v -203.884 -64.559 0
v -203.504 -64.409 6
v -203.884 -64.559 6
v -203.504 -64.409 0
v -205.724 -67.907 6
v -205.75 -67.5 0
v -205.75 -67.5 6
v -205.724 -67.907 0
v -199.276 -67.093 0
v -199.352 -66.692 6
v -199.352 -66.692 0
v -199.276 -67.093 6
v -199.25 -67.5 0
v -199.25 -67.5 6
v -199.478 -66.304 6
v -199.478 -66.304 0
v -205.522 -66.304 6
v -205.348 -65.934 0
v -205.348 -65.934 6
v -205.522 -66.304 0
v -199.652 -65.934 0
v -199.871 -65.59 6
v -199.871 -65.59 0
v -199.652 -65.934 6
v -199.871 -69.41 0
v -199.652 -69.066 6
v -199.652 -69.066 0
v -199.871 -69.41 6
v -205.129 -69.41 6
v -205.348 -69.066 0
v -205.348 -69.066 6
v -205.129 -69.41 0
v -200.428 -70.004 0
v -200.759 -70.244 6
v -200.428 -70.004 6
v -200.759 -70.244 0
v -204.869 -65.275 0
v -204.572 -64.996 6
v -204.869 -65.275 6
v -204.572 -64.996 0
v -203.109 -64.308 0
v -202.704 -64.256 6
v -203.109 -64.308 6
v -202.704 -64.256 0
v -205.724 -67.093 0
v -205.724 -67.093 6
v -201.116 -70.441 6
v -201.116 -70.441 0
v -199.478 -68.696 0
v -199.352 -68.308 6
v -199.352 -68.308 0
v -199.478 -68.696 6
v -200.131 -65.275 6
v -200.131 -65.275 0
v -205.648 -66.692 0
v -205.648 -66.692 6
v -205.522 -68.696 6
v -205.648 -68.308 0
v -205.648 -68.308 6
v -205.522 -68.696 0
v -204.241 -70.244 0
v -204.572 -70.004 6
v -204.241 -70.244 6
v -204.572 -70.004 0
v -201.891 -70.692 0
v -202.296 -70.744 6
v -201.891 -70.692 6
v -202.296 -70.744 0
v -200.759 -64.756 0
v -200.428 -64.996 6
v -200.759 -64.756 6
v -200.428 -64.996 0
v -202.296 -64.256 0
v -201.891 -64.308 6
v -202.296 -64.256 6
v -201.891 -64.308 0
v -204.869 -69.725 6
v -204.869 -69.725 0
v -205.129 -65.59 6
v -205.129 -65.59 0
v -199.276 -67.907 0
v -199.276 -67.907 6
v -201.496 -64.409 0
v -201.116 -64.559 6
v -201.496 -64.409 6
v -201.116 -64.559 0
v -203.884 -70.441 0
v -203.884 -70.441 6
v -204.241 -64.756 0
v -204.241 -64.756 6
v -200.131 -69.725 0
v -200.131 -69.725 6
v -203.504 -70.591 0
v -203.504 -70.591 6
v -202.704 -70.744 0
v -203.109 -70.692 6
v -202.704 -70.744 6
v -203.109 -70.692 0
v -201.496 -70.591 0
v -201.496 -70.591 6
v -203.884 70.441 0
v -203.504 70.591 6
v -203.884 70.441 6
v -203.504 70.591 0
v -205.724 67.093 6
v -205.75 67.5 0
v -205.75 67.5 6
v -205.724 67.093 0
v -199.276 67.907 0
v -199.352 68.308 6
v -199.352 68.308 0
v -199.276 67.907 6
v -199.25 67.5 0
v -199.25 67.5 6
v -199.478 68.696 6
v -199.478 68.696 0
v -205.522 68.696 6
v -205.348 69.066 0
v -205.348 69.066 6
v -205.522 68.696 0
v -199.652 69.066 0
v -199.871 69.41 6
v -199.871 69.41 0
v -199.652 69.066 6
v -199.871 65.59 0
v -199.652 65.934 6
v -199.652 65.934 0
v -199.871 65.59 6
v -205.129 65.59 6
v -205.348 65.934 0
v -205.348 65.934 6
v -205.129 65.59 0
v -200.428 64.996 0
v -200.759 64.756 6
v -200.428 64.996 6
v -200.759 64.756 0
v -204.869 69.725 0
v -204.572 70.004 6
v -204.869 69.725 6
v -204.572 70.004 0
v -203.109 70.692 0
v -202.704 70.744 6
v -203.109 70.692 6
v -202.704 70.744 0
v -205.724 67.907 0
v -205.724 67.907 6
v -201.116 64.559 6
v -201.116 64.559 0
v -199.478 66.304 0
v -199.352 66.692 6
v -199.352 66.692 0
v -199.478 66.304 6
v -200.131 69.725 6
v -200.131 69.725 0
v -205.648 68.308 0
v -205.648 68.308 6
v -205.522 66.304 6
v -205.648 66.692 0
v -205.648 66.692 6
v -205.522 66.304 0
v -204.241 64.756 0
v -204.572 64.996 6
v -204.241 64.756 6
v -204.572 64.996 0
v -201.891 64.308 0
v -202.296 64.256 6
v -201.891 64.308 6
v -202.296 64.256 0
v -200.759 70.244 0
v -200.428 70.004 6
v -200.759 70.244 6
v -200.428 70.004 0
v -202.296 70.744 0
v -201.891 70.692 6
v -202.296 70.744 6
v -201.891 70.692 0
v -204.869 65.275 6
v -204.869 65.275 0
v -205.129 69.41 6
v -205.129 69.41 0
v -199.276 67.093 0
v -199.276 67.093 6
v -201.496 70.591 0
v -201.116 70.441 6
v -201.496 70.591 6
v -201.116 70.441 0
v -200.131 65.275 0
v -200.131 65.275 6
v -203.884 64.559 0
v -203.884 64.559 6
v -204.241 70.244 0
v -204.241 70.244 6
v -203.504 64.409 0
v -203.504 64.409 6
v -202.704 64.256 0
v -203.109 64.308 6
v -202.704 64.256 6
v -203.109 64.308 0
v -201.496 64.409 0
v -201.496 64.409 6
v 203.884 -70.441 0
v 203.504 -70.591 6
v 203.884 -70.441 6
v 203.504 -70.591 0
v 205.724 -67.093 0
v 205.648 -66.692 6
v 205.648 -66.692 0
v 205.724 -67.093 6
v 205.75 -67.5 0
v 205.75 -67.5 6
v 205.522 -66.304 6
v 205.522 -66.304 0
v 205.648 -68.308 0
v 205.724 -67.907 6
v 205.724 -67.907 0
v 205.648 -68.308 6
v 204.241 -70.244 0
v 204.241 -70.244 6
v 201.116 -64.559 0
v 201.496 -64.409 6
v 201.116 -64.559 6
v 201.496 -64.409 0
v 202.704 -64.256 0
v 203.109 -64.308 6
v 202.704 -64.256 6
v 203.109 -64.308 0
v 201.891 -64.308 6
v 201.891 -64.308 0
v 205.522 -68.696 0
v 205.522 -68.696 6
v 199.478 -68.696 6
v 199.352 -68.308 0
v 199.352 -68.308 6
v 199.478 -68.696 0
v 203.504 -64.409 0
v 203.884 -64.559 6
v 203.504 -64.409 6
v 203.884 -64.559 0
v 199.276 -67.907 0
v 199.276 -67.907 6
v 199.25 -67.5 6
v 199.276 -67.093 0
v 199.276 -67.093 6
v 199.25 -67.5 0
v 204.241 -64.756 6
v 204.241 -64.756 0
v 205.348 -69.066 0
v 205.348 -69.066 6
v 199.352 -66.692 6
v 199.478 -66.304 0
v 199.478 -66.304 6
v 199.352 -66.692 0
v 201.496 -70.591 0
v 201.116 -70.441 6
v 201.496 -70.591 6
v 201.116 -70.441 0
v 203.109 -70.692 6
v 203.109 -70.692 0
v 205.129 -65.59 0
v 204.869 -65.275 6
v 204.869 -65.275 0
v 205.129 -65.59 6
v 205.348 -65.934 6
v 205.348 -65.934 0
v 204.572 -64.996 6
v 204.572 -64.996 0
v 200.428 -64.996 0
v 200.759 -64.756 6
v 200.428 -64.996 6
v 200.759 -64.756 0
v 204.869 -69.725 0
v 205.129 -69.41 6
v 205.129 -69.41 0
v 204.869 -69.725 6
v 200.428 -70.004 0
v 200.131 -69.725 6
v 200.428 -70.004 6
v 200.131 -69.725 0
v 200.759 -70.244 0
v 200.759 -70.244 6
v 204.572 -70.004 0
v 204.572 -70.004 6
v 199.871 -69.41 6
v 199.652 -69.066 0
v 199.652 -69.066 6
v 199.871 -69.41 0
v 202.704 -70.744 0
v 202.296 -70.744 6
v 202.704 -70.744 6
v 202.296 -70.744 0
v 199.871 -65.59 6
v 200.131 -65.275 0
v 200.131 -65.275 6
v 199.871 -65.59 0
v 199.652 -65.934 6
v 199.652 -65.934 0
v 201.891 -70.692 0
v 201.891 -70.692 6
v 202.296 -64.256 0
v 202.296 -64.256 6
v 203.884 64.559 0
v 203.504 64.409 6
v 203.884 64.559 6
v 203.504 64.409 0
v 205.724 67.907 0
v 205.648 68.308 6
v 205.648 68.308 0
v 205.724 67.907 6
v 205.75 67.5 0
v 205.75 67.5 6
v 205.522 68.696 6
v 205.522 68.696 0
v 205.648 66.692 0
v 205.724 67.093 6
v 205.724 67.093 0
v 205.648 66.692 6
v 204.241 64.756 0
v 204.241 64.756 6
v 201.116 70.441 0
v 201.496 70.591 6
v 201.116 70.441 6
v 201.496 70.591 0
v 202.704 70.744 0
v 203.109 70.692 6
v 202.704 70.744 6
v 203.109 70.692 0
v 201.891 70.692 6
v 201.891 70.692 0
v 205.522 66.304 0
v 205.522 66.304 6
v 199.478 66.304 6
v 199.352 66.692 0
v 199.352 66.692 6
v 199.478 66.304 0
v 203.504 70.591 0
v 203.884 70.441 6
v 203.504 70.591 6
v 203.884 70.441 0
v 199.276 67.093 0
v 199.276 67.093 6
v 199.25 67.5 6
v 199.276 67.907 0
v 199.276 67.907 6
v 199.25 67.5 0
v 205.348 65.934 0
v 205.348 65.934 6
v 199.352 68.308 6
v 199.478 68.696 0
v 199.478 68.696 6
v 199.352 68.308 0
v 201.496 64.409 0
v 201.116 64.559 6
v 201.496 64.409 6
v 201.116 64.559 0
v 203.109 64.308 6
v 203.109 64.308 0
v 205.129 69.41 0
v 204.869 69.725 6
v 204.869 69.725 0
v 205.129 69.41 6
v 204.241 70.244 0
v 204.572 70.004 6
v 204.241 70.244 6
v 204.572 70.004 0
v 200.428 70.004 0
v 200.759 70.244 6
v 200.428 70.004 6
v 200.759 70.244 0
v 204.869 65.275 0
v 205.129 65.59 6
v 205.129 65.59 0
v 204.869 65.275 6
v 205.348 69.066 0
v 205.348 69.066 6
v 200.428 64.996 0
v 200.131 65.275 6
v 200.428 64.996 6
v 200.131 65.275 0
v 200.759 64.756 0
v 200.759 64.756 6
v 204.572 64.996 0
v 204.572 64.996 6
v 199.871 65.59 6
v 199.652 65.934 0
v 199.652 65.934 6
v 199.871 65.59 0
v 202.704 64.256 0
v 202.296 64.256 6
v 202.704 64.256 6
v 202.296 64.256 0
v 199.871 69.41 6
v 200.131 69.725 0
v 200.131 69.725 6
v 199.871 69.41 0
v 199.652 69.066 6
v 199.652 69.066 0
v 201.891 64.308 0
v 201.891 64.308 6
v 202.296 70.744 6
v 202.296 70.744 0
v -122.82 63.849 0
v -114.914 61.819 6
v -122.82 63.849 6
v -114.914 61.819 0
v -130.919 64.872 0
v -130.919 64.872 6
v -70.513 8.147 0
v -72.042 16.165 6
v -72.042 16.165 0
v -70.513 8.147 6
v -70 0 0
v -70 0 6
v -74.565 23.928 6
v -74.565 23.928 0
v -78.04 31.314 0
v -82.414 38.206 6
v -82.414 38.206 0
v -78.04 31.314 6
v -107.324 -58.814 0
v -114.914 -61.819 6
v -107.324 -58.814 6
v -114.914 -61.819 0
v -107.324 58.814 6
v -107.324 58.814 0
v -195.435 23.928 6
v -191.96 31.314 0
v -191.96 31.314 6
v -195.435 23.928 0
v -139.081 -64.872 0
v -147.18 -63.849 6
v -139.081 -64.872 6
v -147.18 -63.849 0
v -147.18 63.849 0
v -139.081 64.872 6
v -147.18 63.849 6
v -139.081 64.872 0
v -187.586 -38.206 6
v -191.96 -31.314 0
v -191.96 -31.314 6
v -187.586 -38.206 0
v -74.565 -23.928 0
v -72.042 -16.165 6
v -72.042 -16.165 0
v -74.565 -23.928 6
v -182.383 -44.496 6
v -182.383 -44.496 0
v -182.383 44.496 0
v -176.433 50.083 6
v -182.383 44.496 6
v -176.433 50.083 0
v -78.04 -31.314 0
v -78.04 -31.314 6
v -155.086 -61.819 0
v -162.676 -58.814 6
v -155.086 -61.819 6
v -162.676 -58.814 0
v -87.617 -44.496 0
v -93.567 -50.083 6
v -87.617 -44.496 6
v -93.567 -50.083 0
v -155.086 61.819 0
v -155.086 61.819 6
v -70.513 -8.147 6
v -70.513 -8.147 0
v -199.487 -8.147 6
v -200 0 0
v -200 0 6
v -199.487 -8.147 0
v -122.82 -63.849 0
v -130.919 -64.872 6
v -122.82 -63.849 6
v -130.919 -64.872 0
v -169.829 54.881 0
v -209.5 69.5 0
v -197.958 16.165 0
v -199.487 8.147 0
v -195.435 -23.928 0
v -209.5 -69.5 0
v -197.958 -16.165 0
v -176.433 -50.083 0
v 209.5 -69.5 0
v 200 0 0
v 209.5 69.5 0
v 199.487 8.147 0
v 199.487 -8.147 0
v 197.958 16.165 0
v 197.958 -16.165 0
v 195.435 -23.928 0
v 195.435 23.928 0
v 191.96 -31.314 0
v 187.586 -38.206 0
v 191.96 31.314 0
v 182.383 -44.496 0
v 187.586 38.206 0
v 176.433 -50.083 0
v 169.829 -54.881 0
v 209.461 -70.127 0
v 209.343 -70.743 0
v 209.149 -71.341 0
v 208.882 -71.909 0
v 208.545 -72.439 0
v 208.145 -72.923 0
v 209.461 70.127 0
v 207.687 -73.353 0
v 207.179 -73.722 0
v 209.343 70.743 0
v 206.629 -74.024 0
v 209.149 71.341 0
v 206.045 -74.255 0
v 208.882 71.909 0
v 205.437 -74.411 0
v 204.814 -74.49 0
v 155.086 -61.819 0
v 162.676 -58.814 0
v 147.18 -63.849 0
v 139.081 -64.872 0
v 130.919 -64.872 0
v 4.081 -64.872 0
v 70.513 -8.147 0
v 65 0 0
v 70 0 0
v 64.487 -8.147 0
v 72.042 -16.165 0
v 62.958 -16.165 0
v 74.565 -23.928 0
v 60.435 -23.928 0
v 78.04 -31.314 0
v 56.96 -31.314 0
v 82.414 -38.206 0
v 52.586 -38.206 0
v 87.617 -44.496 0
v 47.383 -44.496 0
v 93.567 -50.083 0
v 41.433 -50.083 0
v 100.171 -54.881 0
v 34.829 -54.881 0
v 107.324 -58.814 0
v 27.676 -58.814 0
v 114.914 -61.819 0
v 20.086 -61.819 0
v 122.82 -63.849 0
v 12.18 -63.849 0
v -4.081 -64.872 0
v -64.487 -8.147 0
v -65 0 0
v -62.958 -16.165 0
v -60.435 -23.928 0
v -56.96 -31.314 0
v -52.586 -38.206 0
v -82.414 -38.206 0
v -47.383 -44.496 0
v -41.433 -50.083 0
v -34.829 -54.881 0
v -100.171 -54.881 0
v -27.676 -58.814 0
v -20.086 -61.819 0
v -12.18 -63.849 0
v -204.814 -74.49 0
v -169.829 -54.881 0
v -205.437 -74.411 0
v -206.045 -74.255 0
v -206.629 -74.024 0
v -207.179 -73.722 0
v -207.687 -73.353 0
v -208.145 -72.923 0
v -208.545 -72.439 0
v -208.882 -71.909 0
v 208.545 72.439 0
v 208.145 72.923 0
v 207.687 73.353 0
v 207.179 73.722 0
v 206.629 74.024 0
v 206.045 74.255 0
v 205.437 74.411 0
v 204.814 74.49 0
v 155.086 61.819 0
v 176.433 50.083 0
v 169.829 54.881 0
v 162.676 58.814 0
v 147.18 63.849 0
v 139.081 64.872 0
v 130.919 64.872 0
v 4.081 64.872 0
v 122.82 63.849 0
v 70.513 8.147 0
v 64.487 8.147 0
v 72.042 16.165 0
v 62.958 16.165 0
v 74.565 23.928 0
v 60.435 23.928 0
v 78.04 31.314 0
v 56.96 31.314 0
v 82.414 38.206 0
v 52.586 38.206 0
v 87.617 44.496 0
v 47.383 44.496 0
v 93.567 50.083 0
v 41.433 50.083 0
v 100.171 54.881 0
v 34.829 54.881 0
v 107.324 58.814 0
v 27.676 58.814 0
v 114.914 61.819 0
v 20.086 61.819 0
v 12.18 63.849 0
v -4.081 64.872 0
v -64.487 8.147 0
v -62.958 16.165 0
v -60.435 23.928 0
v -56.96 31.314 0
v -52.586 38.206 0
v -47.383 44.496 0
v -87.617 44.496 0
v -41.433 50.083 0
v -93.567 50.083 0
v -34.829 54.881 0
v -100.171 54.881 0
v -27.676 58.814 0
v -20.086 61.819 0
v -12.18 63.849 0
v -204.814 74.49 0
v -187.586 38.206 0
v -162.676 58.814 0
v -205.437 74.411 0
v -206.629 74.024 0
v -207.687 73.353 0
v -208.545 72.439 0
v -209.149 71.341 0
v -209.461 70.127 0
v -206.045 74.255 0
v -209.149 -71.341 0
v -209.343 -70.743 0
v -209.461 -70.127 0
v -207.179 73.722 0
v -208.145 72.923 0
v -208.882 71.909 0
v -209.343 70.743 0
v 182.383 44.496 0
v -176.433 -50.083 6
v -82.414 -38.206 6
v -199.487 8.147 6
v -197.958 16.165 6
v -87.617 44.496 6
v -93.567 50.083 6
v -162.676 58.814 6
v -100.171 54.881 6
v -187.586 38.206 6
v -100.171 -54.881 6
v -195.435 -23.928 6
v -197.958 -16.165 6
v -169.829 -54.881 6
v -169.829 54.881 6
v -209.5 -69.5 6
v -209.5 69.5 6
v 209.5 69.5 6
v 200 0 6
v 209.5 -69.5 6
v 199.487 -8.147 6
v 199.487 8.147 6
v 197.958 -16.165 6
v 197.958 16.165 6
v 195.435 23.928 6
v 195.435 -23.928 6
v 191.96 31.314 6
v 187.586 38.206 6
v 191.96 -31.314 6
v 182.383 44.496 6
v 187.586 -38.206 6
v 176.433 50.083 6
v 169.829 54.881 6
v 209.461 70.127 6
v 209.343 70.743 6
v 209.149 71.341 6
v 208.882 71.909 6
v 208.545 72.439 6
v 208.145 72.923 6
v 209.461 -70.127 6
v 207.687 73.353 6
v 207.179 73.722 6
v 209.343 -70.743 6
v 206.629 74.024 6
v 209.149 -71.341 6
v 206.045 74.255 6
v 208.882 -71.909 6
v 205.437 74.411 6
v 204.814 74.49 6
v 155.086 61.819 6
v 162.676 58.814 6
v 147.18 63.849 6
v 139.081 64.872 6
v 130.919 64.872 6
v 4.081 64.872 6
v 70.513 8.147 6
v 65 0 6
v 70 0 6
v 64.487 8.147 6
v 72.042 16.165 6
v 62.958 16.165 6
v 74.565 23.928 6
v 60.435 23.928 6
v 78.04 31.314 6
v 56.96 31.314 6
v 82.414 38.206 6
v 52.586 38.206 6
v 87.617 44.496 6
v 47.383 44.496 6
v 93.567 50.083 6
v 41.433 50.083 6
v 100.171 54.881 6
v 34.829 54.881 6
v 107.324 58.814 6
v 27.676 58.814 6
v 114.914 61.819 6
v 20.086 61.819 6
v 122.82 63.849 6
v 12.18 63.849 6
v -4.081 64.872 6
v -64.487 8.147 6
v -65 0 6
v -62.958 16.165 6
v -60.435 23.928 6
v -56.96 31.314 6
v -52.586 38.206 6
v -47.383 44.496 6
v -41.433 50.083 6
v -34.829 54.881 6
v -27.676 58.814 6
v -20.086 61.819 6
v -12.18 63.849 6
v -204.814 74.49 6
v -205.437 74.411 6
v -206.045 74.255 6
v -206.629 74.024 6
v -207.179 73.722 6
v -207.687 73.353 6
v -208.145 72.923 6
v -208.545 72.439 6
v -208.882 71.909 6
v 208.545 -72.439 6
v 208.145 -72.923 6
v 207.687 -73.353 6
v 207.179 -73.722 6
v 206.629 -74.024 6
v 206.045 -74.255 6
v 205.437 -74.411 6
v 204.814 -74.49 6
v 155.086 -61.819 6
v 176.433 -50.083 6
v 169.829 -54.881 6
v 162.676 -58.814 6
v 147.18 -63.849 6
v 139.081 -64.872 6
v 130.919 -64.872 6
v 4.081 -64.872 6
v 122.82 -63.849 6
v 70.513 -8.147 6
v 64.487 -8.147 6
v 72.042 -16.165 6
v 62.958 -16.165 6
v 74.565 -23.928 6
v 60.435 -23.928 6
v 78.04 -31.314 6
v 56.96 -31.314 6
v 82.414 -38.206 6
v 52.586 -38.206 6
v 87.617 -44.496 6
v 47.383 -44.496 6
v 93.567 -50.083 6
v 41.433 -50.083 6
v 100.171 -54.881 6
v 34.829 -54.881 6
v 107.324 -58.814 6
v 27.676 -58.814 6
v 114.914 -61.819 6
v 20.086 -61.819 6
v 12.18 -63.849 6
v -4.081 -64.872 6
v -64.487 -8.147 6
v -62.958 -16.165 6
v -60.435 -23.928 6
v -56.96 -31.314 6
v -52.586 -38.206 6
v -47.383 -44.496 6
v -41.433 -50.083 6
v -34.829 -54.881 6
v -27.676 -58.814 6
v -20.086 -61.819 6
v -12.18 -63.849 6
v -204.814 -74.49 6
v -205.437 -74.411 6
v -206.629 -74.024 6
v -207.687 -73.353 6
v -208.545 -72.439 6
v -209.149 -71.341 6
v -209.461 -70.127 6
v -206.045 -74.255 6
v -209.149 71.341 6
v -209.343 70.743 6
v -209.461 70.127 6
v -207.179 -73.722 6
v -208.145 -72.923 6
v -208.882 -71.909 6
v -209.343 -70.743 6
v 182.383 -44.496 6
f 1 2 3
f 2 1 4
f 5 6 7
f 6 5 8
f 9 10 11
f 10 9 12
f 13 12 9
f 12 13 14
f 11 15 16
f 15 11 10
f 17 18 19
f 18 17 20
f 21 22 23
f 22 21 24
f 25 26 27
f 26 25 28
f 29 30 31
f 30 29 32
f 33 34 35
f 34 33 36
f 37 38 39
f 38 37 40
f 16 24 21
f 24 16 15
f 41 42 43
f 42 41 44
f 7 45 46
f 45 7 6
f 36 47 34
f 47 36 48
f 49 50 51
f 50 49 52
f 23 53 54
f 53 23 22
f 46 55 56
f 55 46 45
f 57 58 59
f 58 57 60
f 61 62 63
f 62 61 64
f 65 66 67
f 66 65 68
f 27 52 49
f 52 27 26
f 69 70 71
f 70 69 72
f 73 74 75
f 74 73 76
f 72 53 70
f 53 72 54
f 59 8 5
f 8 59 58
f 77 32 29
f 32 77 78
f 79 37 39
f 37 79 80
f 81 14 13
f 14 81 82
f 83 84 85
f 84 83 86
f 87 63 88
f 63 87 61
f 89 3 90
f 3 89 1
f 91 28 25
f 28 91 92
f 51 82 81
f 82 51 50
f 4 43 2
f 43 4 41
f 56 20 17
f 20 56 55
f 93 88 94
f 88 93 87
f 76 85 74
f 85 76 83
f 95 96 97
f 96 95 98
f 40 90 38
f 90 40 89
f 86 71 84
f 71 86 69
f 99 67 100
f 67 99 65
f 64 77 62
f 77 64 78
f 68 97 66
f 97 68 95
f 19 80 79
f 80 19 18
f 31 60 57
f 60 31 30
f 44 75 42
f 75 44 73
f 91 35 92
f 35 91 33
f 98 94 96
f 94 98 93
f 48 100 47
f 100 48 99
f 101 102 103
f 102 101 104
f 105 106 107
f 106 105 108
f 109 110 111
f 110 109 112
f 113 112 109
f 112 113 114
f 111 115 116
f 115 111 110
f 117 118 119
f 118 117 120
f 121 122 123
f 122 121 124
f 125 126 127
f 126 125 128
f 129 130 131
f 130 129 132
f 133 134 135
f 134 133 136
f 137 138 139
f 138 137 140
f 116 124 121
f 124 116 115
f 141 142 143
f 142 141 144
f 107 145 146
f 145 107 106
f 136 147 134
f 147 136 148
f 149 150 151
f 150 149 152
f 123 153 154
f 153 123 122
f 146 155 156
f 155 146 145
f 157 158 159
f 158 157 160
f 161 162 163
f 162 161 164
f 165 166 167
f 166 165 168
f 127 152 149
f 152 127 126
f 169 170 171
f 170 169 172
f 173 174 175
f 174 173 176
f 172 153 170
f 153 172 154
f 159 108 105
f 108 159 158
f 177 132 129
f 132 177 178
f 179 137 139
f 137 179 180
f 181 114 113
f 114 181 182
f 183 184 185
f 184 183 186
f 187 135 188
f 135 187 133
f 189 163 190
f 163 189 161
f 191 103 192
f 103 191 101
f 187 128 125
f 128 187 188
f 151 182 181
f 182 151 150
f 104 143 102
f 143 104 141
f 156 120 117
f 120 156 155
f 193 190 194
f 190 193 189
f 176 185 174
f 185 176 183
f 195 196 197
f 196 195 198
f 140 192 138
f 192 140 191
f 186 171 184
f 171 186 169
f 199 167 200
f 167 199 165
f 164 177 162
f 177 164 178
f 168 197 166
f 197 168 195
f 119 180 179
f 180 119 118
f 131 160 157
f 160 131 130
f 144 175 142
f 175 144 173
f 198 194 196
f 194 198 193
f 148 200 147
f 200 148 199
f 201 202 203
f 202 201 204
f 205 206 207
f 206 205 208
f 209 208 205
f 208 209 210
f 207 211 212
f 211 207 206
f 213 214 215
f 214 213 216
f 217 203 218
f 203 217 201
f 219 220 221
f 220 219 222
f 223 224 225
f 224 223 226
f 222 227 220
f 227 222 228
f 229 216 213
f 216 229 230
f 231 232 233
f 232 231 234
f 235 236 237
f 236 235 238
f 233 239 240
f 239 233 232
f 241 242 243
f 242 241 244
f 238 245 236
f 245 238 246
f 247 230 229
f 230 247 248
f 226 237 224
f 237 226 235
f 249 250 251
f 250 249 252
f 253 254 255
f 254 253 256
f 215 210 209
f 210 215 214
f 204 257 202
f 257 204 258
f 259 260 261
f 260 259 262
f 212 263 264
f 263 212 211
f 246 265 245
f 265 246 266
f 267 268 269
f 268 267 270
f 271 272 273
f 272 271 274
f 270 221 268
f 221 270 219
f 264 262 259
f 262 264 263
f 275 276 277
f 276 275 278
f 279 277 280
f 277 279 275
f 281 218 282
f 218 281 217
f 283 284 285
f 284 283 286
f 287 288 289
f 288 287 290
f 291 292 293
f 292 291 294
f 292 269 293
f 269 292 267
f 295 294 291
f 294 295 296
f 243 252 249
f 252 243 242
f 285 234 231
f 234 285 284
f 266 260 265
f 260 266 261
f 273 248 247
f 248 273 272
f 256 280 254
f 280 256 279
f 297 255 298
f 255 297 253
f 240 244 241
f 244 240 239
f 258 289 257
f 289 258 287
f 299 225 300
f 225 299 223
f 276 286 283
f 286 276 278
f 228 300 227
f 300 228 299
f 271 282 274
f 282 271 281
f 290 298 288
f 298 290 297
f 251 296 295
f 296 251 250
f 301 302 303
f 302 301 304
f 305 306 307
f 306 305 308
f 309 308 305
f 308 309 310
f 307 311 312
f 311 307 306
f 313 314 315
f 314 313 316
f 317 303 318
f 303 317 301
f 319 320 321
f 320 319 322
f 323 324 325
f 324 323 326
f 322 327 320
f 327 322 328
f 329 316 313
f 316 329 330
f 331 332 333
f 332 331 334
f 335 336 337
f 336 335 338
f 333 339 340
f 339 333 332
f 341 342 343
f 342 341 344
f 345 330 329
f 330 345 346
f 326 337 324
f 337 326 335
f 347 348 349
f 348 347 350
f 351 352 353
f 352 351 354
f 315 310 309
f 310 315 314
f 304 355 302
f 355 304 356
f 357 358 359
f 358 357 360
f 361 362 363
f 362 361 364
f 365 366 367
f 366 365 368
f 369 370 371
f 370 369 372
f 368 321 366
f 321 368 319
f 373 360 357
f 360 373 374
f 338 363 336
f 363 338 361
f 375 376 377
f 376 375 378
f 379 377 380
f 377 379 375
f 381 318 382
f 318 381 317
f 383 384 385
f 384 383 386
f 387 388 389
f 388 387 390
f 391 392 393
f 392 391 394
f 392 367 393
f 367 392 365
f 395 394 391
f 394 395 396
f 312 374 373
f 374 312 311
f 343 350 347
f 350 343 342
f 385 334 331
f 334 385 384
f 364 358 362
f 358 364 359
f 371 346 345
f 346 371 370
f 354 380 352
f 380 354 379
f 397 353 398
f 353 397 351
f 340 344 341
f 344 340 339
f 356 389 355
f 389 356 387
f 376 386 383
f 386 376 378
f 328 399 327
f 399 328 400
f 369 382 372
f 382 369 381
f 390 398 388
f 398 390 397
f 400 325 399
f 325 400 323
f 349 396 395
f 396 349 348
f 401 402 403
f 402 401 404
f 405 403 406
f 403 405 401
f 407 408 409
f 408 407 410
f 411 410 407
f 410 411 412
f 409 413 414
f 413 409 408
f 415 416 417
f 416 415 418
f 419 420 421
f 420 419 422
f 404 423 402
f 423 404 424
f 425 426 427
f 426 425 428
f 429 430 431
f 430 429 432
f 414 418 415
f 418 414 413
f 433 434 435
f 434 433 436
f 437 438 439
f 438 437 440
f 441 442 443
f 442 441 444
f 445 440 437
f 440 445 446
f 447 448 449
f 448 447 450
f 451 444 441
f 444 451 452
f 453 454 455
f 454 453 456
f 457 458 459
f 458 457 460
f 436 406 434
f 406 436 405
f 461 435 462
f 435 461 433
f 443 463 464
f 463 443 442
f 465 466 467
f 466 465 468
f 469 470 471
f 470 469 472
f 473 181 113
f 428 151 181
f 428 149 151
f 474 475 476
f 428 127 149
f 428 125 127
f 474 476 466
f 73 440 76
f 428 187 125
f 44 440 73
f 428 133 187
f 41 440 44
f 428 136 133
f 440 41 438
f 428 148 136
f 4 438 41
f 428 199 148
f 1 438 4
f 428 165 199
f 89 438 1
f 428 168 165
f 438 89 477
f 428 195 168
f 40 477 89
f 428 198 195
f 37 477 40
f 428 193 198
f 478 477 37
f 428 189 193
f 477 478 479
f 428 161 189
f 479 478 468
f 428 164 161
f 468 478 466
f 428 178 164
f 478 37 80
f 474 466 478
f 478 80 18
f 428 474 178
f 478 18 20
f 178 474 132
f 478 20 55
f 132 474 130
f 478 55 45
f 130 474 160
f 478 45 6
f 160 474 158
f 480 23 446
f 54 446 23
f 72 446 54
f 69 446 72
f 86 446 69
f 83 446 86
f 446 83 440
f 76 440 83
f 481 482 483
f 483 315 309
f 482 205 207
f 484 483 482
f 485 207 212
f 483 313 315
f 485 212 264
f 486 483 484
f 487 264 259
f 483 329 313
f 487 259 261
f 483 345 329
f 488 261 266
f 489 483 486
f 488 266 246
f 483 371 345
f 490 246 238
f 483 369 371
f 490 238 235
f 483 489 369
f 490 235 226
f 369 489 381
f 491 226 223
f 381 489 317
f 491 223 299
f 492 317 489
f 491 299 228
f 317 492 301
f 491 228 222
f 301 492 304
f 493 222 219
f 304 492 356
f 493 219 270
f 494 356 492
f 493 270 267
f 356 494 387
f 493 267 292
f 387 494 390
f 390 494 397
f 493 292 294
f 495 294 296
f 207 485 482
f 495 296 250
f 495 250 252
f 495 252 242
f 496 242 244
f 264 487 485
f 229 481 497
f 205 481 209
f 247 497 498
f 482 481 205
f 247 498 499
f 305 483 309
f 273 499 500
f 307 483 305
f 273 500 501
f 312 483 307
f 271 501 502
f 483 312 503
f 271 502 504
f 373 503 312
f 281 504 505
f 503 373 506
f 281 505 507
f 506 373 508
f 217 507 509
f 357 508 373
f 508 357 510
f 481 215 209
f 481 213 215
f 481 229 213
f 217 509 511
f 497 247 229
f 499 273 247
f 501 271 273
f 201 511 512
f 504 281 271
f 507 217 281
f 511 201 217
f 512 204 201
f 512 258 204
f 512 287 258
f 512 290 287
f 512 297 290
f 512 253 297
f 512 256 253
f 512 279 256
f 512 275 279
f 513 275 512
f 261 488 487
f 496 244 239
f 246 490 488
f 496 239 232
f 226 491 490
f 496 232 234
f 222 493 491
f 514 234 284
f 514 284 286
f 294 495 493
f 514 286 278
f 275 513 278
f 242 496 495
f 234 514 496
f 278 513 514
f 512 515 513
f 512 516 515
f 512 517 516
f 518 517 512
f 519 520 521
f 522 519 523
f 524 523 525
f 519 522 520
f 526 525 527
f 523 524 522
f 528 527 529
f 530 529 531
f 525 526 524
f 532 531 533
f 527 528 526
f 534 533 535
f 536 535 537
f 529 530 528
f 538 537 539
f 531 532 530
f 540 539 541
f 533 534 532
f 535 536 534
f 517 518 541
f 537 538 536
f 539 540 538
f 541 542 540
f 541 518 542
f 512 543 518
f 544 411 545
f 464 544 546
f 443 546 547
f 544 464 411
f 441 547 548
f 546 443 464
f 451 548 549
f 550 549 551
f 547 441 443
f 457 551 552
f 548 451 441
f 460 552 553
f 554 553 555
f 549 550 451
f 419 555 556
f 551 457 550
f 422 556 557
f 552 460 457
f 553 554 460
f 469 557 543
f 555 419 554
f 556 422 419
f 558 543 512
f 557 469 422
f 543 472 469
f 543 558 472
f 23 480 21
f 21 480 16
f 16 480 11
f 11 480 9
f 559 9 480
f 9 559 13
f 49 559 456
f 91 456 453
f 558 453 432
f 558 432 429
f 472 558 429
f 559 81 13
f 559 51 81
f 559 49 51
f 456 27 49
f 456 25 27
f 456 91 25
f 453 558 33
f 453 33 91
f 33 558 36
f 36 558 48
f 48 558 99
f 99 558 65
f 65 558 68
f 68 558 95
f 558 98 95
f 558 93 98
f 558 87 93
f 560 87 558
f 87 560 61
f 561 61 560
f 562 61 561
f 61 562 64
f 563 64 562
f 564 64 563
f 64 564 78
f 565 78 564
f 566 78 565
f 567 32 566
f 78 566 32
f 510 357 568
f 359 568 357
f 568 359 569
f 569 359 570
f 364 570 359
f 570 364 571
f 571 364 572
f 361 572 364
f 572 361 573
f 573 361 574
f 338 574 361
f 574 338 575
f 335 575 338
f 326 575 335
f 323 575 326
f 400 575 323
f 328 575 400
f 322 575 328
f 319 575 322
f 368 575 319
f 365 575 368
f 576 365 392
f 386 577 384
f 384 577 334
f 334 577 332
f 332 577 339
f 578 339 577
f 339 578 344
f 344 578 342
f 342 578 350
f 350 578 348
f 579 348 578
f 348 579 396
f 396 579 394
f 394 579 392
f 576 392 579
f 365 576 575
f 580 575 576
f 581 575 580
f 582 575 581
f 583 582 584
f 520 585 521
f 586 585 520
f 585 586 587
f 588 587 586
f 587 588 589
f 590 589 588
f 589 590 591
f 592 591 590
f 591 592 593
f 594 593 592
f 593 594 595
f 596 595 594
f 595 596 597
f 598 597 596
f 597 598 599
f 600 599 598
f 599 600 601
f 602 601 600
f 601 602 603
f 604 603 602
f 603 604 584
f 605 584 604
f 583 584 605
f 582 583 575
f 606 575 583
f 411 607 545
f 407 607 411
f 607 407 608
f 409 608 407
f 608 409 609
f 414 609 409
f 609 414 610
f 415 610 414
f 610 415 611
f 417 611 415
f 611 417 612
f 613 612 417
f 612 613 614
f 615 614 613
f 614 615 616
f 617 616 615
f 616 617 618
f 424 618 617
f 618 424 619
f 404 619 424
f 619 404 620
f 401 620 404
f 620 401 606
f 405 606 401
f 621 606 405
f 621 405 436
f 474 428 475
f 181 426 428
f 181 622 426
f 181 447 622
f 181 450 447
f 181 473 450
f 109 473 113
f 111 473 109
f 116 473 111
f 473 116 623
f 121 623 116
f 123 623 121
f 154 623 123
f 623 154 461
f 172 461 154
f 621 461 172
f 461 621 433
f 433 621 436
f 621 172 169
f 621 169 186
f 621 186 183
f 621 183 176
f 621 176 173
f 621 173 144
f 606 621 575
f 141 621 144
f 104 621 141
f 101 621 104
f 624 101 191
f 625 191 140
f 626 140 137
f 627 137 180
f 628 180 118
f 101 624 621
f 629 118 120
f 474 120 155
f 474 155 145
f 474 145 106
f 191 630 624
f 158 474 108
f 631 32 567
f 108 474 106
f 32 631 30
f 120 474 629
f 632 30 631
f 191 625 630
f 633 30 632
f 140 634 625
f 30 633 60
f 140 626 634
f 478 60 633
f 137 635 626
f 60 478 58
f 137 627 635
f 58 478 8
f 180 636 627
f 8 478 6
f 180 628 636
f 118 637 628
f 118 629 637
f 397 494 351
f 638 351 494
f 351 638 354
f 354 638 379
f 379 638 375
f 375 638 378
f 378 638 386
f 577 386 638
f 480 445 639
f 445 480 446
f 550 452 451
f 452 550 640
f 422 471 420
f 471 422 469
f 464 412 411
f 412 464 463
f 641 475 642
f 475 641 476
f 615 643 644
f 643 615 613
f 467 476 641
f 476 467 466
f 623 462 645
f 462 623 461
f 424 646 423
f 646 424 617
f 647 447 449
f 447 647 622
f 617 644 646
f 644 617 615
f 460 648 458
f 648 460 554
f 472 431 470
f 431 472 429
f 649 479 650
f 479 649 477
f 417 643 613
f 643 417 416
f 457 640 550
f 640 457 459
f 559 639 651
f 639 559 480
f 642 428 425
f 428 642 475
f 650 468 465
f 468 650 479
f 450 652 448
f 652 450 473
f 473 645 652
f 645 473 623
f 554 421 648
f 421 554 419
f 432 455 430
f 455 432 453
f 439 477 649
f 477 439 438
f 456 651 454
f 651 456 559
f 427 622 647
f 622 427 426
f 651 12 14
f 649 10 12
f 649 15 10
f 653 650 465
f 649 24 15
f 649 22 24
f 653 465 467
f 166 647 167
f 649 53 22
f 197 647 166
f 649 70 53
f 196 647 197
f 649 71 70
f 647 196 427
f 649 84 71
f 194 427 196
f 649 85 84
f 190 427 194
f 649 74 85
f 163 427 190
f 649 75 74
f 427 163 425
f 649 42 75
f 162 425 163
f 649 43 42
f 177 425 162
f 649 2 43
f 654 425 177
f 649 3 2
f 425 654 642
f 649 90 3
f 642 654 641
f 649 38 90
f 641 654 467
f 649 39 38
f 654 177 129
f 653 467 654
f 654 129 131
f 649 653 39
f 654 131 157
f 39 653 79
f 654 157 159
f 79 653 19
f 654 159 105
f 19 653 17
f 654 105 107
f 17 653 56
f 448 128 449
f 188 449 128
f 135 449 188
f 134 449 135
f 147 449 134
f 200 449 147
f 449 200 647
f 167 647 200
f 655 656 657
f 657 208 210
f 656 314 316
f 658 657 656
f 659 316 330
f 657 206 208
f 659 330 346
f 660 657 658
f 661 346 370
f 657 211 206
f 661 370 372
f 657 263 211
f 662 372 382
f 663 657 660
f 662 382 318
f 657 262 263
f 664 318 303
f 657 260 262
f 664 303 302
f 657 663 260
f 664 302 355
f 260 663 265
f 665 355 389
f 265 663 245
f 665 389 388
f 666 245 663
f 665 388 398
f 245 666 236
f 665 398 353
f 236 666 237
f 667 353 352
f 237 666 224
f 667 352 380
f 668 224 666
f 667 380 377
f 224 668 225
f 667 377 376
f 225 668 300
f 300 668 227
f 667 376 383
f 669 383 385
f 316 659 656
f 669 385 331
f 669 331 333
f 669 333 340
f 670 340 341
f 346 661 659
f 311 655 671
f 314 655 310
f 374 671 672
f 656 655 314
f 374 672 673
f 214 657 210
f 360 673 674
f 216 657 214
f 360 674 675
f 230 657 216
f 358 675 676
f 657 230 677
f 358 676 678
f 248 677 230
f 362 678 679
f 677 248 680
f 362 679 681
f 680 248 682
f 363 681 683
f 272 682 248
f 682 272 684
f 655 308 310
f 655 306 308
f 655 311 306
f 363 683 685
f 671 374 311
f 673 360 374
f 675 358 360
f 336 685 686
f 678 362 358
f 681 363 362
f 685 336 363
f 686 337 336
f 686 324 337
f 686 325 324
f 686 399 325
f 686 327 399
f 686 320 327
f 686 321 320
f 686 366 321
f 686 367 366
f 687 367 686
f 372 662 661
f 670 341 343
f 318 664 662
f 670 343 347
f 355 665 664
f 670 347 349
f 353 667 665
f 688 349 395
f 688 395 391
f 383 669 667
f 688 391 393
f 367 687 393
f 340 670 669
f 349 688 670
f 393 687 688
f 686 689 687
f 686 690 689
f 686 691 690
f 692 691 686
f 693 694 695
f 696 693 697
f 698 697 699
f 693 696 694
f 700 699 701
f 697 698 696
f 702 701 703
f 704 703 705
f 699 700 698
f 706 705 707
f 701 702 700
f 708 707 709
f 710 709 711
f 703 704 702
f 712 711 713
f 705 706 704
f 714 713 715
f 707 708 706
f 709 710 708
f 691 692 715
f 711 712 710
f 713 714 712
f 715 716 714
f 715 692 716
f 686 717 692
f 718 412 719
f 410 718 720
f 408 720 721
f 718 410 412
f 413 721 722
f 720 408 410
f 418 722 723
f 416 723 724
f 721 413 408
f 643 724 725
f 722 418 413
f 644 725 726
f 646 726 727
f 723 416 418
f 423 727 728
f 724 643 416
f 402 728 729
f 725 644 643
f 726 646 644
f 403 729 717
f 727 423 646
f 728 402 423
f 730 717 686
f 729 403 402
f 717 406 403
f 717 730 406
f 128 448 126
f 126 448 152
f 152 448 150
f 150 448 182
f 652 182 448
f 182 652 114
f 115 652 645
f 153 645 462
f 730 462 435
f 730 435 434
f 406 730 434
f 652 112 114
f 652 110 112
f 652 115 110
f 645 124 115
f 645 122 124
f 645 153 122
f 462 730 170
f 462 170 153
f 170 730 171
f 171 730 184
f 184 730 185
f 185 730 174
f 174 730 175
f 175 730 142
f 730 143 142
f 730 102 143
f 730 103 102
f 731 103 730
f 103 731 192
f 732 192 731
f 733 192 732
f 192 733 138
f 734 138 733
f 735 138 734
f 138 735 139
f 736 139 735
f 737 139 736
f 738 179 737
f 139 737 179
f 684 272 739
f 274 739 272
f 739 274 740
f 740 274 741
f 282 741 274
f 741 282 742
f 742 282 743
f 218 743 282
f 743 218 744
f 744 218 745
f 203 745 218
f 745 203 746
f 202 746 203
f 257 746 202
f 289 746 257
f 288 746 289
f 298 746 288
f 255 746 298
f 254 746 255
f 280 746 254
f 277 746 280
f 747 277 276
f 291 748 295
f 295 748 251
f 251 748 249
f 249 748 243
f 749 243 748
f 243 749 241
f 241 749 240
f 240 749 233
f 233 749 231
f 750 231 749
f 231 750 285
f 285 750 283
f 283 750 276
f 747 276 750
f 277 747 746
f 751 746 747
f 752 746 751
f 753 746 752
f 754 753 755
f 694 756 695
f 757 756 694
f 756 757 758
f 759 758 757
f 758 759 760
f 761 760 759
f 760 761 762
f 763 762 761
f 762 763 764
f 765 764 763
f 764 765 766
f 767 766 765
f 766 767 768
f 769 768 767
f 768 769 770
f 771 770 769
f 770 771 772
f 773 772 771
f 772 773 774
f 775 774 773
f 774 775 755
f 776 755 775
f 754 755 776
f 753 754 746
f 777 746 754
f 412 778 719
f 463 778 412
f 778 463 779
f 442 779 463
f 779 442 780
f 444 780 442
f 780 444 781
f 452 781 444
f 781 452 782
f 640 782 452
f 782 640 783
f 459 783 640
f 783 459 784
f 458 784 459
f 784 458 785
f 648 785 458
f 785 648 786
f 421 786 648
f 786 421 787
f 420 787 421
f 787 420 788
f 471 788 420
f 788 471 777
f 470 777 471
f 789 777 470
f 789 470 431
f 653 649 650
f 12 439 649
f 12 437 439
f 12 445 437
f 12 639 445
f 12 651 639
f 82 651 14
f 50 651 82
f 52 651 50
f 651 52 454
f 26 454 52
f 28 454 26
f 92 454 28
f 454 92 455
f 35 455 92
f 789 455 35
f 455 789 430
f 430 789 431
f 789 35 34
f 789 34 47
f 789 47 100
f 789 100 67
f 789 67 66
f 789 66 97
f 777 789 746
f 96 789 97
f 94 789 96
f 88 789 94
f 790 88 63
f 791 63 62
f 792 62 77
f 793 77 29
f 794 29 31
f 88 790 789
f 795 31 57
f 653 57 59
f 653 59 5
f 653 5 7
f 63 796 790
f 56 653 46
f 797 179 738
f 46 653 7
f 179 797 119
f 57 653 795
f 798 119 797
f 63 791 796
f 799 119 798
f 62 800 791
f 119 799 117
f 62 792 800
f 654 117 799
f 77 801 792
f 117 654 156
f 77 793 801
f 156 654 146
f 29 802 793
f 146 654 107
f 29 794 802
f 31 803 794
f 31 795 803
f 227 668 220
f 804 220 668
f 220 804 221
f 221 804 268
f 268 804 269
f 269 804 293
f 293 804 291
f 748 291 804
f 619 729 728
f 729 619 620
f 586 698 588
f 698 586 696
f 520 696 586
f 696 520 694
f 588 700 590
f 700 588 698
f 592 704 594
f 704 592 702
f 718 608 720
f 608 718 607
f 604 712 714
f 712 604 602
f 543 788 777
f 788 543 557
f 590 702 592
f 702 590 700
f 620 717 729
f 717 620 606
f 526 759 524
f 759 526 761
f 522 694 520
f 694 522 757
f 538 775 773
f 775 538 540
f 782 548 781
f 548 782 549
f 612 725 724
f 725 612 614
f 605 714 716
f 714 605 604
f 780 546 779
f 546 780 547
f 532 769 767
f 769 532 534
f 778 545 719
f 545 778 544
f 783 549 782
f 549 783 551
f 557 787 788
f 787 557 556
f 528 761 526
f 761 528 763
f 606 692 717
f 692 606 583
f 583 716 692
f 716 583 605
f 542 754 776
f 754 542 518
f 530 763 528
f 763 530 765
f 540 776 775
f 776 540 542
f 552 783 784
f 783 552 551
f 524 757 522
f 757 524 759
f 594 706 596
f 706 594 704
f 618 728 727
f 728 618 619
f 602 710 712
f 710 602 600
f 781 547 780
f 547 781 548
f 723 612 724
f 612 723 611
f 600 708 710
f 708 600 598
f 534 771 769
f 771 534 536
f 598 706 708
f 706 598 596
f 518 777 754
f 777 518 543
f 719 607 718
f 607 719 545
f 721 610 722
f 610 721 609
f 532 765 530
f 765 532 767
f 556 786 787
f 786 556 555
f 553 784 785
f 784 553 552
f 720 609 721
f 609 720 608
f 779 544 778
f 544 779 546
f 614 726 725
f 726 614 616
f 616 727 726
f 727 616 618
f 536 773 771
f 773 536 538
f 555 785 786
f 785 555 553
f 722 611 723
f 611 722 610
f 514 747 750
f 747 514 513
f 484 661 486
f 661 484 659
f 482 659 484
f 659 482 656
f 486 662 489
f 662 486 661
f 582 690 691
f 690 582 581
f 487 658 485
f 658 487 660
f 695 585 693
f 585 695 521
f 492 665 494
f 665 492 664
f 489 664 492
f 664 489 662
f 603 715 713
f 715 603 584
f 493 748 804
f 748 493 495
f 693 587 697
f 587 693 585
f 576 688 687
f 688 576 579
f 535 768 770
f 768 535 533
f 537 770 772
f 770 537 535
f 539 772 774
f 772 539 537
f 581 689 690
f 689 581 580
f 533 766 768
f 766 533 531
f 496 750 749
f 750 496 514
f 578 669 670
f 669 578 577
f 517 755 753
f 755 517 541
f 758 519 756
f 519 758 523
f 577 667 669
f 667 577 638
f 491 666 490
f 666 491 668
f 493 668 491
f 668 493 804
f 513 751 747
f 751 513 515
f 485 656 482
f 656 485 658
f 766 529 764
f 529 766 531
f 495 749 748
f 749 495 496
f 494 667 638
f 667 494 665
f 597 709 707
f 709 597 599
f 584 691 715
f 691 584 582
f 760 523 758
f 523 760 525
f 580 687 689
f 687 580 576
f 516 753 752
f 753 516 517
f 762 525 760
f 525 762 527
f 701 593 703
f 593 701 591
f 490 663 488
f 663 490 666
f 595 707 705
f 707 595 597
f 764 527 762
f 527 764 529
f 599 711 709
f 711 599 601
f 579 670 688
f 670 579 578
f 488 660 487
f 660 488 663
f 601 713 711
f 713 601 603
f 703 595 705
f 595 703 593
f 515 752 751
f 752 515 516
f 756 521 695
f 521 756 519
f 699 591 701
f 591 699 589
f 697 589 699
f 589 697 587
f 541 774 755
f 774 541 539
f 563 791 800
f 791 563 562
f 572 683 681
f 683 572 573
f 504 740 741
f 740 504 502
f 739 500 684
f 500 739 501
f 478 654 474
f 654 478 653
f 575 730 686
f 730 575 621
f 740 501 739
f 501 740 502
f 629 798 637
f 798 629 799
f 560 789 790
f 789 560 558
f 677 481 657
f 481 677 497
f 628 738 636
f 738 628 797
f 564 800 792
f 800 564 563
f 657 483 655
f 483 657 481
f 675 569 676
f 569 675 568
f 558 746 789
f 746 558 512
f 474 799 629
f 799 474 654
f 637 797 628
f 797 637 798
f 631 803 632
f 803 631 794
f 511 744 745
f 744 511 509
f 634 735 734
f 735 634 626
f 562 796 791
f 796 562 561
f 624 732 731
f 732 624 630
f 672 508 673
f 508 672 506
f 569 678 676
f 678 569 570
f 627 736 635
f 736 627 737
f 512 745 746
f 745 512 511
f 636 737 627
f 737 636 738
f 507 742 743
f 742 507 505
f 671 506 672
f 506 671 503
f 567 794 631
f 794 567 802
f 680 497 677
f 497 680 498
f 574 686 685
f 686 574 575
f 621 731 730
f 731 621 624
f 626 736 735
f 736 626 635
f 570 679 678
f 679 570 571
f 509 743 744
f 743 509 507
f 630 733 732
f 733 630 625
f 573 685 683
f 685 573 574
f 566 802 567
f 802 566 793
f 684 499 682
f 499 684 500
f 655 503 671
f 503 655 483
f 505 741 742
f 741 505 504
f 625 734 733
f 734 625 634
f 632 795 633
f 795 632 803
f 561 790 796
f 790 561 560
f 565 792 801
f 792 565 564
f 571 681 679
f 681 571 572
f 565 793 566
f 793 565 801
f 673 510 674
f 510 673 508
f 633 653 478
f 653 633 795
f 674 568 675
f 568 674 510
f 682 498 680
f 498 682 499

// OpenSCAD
$fn = 50;

difference() {
	union() {
		hull() {
			translate(v = [-204.5, 69.5, 0]) {
				cylinder(h = 6, r = 5);
			}
			translate(v = [204.5, 69.5, 0]) {
				cylinder(h = 6, r = 5);
			}
			translate(v = [-204.5, -69.5, 0]) {
				cylinder(h = 6, r = 5);
			}
			translate(v = [204.5, -69.5, 0]) {
				cylinder(h = 6, r = 5);
			}
		}
	}
	union() {
		translate(v = [-202.5, -67.5, -100.0]) {
			cylinder(h = 200, r = 3.25);
		}
		translate(v = [-202.5, 67.5, -100.0]) {
			cylinder(h = 200, r = 3.25);
		}
		translate(v = [202.5, -67.5, -100.0]) {
			cylinder(h = 200, r = 3.25);
		}
		translate(v = [202.5, 67.5, -100.0]) {
			cylinder(h = 200, r = 3.25);
		}
		translate(v = [-202.5, -67.5, -100.0]) {
			cylinder(h = 200, r = 1.8);
		}
		translate(v = [-202.5, 67.5, -100.0]) {
			cylinder(h = 200, r = 1.8);
		}
		translate(v = [202.5, -67.5, -100.0]) {
			cylinder(h = 200, r = 1.8);
		}
		translate(v = [202.5, 67.5, -100.0]) {
			cylinder(h = 200, r = 1.8);
		}
		translate(v = [-135.0, 0, 0.0]) {
			cylinder(h = 6, r = 65.0);
		}
		cylinder(h = 6, r = 65.0);
		translate(v = [135.0, 0, 0.0]) {
			cylinder(h = 6, r = 65.0);
		}
	}
}
